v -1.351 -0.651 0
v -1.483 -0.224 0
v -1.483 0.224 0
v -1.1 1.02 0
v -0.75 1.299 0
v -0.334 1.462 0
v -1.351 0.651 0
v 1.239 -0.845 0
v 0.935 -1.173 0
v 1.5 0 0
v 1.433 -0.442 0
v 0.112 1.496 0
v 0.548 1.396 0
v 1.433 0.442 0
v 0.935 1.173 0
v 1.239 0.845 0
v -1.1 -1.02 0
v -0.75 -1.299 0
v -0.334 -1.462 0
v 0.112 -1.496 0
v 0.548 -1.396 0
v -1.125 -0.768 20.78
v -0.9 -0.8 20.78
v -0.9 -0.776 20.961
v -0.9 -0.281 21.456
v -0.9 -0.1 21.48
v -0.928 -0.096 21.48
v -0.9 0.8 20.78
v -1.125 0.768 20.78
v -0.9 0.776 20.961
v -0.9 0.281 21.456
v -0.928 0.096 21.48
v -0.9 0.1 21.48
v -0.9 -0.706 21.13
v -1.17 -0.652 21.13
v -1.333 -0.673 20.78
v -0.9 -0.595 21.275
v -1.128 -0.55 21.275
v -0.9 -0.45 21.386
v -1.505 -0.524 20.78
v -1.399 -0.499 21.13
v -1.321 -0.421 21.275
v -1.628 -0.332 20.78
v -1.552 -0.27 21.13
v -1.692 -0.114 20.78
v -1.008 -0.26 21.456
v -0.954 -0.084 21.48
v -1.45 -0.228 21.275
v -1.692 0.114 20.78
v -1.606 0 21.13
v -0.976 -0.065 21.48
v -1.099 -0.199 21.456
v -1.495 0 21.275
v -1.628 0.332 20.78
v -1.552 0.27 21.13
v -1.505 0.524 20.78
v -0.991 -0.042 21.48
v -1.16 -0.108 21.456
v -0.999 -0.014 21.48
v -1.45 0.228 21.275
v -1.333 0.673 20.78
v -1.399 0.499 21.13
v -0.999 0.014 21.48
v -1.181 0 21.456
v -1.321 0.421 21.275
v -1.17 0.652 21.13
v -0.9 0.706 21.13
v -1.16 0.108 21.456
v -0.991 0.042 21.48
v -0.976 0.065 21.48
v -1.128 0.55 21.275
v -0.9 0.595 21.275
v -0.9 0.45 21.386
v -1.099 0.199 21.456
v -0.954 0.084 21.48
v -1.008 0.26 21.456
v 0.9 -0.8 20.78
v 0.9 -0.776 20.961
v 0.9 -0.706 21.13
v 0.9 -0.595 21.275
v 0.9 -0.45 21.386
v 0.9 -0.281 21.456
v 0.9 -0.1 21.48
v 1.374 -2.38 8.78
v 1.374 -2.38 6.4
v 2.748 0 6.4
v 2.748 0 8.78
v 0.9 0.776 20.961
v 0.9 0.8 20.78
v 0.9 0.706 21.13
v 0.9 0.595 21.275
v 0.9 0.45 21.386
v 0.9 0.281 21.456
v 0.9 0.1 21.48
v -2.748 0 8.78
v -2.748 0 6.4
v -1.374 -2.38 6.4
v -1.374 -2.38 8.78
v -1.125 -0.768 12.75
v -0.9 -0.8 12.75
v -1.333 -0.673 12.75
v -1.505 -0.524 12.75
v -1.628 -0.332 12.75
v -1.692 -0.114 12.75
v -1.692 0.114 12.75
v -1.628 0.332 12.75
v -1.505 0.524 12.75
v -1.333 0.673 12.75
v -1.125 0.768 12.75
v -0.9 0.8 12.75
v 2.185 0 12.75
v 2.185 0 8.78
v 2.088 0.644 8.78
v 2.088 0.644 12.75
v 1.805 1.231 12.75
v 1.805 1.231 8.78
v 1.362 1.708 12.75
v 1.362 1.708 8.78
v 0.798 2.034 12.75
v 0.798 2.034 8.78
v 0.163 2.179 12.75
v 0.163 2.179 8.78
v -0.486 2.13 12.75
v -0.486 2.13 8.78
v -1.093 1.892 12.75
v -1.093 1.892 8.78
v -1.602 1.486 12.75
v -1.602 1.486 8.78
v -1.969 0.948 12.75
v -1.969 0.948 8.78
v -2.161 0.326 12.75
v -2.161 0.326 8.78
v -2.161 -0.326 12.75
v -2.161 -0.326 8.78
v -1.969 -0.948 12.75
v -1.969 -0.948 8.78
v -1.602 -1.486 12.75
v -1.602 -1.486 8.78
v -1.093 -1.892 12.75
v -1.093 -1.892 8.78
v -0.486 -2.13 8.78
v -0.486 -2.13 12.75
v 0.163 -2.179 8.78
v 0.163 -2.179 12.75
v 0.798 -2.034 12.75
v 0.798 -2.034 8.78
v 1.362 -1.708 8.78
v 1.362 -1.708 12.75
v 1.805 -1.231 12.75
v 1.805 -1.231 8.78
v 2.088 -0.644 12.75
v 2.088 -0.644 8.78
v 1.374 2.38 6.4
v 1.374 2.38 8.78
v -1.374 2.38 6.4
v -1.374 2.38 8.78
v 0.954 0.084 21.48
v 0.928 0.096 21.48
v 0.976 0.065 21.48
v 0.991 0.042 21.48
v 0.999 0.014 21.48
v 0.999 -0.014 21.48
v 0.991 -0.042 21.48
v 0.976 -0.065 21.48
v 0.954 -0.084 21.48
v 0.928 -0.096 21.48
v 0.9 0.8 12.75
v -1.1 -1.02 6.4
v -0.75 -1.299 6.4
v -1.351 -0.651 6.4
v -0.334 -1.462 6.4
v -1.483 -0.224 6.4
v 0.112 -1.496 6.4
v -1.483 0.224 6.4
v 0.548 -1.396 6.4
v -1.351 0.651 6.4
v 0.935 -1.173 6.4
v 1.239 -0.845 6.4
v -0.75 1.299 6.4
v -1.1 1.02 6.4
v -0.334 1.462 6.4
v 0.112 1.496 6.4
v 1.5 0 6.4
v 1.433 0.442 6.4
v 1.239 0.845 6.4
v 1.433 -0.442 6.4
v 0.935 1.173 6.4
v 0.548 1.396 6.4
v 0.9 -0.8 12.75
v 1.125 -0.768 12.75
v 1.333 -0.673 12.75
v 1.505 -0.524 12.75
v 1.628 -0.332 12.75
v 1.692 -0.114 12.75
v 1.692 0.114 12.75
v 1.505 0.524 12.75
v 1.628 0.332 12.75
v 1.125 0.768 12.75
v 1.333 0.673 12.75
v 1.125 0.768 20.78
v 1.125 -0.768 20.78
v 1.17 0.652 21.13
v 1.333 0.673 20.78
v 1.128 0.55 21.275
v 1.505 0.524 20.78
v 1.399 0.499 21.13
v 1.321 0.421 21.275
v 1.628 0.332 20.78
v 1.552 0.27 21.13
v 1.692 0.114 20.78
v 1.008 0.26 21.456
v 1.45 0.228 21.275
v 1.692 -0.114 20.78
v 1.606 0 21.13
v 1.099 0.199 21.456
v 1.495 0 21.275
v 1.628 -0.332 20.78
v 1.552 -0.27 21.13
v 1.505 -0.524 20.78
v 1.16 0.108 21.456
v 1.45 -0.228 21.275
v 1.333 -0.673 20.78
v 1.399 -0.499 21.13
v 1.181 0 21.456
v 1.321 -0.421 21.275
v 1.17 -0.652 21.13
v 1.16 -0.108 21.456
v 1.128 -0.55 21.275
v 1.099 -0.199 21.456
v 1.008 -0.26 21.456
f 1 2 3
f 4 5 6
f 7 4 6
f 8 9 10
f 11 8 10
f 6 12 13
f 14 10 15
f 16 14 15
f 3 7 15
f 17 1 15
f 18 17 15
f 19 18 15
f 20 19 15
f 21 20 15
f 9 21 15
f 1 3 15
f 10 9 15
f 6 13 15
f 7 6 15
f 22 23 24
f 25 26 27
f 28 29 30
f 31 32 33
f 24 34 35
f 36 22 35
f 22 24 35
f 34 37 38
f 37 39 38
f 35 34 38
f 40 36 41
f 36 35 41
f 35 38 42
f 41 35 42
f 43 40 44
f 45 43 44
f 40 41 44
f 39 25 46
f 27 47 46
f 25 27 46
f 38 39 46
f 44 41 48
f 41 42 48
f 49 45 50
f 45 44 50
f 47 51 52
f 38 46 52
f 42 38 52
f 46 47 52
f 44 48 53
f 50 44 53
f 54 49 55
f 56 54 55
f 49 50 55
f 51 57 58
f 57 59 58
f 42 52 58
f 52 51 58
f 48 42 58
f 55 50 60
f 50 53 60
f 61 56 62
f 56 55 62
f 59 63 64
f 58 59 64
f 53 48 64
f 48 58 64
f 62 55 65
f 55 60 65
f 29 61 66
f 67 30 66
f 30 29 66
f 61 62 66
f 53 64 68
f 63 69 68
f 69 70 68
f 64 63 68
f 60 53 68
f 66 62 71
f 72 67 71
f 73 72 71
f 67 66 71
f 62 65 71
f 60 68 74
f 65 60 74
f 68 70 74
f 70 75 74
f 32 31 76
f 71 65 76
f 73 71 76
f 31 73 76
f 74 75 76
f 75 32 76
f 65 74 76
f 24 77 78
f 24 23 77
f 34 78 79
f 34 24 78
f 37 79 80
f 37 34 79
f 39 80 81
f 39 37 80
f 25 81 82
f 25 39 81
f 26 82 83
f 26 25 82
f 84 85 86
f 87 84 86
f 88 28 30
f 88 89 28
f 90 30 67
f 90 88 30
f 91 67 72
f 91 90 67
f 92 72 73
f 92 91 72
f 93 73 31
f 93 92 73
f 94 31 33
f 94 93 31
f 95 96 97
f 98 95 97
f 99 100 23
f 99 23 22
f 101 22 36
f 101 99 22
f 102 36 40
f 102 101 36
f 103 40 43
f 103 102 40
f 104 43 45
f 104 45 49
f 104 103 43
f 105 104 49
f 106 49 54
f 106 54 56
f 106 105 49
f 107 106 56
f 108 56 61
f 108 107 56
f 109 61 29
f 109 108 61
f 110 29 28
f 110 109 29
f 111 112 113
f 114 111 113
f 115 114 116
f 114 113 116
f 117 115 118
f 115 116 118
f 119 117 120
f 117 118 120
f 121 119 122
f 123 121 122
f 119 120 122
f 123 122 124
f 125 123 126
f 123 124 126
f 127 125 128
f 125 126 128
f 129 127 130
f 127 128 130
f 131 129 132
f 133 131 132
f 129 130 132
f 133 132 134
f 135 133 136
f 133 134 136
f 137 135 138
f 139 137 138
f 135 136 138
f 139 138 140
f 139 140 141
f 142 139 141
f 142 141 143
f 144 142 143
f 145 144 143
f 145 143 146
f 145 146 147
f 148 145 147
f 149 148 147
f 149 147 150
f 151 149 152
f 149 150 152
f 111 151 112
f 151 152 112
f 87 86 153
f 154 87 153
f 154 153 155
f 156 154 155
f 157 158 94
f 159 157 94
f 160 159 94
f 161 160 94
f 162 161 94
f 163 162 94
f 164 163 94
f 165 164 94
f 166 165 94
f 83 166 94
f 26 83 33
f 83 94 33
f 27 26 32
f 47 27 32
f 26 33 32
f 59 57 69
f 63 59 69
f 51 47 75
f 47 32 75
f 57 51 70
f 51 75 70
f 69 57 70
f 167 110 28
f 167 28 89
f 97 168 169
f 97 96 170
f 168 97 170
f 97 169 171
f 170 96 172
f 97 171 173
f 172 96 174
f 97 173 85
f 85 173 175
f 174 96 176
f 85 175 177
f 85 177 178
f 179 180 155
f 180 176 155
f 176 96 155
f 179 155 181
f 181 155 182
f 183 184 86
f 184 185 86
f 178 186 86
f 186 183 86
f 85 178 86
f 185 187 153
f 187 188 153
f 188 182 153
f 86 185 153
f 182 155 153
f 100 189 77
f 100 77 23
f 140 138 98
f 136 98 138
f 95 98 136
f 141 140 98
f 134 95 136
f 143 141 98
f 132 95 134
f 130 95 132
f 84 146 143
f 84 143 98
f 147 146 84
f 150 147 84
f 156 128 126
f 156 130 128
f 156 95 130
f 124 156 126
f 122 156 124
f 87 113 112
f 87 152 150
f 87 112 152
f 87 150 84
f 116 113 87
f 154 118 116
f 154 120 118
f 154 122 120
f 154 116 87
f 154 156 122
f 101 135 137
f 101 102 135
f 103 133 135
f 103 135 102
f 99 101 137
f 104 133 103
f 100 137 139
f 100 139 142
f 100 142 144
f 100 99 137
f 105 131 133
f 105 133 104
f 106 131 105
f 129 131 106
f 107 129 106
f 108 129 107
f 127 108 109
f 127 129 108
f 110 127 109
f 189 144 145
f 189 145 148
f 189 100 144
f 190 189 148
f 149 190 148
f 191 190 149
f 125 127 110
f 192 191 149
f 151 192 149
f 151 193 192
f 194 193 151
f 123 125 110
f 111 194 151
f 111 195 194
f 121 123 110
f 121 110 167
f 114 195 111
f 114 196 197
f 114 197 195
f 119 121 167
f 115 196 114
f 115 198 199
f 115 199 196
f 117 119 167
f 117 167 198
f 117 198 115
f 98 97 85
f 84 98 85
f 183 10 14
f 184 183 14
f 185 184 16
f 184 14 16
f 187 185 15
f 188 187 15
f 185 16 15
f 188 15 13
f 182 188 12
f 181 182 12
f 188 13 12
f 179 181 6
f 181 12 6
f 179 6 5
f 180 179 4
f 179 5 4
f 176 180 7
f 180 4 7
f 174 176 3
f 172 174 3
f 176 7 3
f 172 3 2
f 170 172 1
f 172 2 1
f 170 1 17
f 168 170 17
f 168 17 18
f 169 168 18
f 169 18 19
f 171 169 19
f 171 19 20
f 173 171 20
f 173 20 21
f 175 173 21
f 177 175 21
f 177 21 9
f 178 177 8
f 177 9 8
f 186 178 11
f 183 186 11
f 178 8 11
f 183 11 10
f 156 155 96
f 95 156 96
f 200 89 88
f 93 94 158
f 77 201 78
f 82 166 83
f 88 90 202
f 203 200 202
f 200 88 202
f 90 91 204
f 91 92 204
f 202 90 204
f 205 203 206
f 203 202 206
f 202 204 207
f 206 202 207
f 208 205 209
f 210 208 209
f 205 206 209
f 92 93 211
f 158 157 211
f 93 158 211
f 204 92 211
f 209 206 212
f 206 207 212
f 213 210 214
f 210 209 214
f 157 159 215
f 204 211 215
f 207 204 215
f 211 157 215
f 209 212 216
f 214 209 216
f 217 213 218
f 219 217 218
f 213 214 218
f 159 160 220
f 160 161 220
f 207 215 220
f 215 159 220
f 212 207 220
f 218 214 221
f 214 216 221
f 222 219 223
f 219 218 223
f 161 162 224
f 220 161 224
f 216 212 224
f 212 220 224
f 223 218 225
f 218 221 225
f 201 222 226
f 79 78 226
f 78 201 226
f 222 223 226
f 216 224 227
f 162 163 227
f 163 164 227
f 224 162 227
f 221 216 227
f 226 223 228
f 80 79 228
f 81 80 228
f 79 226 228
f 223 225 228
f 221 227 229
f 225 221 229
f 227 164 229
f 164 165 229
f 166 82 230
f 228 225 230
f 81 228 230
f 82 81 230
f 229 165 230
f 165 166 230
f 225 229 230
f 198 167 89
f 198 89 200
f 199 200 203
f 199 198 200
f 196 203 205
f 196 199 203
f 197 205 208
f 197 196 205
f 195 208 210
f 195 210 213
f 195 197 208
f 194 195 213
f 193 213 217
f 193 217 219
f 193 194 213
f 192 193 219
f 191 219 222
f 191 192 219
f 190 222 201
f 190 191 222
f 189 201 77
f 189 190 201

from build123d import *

# Parameters (mm, degrees)
SKETCH1_R           = 1.5
BOSS_EXTRUDE1_DEPTH = 6.4
BOSS_EXTRUDE2_DEPTH = 2.38
SKETCH3_R           = 2.185
BOSS_EXTRUDE3_DEPTH = 3.97
BOSS_EXTRUDE4_DEPTH = 8.73
FILLET1_R           = 0.7


with BuildPart() as part:
    # Sketch1 → Boss-Extrude1 (new body)
    with BuildSketch(Plane.XY):
        Circle(SKETCH1_R)
    extrude(amount=BOSS_EXTRUDE1_DEPTH)

    # Sketch2 → Boss-Extrude2 (add)
    with BuildSketch(Plane.XY.offset(6.4)):
        Polygon((1.374093641, -2.38), (2.748187281, 0), (1.374093641, 2.38), (-1.374093641, 2.38), (-2.748187281, 0), (-1.374093641, -2.38), align=None)
    extrude(amount=BOSS_EXTRUDE2_DEPTH)

    # Sketch3 → Boss-Extrude3 (add)
    with BuildSketch(Plane.XY.offset(8.78)):
        Circle(SKETCH3_R)
    extrude(amount=BOSS_EXTRUDE3_DEPTH)

    # Sketch4 → Boss-Extrude4 (add)
    with BuildSketch(Plane.XY.offset(12.75)):
        with BuildLine():
            Line((-0.9, 0.8), (0.9, 0.8))
            ThreePointArc((0.9, 0.8), (1.7, 0), (0.9, -0.8))
            Line((0.9, -0.8), (-0.9, -0.8))
            ThreePointArc((-0.9, -0.8), (-1.7, 0), (-0.9, 0.8))
        make_face()
    extrude(amount=BOSS_EXTRUDE4_DEPTH)

    # Fillet1
    fillet1_edges = [part.edges().sort_by_distance(p)[0] for p in [
        (-1.7, 0, 21.48),
        (0, -0.8, 21.48),
        (1.7, 0, 21.48),
        (0, 0.8, 21.48),
    ]]
    fillet(fillet1_edges, radius=FILLET1_R)


solid = part.part
